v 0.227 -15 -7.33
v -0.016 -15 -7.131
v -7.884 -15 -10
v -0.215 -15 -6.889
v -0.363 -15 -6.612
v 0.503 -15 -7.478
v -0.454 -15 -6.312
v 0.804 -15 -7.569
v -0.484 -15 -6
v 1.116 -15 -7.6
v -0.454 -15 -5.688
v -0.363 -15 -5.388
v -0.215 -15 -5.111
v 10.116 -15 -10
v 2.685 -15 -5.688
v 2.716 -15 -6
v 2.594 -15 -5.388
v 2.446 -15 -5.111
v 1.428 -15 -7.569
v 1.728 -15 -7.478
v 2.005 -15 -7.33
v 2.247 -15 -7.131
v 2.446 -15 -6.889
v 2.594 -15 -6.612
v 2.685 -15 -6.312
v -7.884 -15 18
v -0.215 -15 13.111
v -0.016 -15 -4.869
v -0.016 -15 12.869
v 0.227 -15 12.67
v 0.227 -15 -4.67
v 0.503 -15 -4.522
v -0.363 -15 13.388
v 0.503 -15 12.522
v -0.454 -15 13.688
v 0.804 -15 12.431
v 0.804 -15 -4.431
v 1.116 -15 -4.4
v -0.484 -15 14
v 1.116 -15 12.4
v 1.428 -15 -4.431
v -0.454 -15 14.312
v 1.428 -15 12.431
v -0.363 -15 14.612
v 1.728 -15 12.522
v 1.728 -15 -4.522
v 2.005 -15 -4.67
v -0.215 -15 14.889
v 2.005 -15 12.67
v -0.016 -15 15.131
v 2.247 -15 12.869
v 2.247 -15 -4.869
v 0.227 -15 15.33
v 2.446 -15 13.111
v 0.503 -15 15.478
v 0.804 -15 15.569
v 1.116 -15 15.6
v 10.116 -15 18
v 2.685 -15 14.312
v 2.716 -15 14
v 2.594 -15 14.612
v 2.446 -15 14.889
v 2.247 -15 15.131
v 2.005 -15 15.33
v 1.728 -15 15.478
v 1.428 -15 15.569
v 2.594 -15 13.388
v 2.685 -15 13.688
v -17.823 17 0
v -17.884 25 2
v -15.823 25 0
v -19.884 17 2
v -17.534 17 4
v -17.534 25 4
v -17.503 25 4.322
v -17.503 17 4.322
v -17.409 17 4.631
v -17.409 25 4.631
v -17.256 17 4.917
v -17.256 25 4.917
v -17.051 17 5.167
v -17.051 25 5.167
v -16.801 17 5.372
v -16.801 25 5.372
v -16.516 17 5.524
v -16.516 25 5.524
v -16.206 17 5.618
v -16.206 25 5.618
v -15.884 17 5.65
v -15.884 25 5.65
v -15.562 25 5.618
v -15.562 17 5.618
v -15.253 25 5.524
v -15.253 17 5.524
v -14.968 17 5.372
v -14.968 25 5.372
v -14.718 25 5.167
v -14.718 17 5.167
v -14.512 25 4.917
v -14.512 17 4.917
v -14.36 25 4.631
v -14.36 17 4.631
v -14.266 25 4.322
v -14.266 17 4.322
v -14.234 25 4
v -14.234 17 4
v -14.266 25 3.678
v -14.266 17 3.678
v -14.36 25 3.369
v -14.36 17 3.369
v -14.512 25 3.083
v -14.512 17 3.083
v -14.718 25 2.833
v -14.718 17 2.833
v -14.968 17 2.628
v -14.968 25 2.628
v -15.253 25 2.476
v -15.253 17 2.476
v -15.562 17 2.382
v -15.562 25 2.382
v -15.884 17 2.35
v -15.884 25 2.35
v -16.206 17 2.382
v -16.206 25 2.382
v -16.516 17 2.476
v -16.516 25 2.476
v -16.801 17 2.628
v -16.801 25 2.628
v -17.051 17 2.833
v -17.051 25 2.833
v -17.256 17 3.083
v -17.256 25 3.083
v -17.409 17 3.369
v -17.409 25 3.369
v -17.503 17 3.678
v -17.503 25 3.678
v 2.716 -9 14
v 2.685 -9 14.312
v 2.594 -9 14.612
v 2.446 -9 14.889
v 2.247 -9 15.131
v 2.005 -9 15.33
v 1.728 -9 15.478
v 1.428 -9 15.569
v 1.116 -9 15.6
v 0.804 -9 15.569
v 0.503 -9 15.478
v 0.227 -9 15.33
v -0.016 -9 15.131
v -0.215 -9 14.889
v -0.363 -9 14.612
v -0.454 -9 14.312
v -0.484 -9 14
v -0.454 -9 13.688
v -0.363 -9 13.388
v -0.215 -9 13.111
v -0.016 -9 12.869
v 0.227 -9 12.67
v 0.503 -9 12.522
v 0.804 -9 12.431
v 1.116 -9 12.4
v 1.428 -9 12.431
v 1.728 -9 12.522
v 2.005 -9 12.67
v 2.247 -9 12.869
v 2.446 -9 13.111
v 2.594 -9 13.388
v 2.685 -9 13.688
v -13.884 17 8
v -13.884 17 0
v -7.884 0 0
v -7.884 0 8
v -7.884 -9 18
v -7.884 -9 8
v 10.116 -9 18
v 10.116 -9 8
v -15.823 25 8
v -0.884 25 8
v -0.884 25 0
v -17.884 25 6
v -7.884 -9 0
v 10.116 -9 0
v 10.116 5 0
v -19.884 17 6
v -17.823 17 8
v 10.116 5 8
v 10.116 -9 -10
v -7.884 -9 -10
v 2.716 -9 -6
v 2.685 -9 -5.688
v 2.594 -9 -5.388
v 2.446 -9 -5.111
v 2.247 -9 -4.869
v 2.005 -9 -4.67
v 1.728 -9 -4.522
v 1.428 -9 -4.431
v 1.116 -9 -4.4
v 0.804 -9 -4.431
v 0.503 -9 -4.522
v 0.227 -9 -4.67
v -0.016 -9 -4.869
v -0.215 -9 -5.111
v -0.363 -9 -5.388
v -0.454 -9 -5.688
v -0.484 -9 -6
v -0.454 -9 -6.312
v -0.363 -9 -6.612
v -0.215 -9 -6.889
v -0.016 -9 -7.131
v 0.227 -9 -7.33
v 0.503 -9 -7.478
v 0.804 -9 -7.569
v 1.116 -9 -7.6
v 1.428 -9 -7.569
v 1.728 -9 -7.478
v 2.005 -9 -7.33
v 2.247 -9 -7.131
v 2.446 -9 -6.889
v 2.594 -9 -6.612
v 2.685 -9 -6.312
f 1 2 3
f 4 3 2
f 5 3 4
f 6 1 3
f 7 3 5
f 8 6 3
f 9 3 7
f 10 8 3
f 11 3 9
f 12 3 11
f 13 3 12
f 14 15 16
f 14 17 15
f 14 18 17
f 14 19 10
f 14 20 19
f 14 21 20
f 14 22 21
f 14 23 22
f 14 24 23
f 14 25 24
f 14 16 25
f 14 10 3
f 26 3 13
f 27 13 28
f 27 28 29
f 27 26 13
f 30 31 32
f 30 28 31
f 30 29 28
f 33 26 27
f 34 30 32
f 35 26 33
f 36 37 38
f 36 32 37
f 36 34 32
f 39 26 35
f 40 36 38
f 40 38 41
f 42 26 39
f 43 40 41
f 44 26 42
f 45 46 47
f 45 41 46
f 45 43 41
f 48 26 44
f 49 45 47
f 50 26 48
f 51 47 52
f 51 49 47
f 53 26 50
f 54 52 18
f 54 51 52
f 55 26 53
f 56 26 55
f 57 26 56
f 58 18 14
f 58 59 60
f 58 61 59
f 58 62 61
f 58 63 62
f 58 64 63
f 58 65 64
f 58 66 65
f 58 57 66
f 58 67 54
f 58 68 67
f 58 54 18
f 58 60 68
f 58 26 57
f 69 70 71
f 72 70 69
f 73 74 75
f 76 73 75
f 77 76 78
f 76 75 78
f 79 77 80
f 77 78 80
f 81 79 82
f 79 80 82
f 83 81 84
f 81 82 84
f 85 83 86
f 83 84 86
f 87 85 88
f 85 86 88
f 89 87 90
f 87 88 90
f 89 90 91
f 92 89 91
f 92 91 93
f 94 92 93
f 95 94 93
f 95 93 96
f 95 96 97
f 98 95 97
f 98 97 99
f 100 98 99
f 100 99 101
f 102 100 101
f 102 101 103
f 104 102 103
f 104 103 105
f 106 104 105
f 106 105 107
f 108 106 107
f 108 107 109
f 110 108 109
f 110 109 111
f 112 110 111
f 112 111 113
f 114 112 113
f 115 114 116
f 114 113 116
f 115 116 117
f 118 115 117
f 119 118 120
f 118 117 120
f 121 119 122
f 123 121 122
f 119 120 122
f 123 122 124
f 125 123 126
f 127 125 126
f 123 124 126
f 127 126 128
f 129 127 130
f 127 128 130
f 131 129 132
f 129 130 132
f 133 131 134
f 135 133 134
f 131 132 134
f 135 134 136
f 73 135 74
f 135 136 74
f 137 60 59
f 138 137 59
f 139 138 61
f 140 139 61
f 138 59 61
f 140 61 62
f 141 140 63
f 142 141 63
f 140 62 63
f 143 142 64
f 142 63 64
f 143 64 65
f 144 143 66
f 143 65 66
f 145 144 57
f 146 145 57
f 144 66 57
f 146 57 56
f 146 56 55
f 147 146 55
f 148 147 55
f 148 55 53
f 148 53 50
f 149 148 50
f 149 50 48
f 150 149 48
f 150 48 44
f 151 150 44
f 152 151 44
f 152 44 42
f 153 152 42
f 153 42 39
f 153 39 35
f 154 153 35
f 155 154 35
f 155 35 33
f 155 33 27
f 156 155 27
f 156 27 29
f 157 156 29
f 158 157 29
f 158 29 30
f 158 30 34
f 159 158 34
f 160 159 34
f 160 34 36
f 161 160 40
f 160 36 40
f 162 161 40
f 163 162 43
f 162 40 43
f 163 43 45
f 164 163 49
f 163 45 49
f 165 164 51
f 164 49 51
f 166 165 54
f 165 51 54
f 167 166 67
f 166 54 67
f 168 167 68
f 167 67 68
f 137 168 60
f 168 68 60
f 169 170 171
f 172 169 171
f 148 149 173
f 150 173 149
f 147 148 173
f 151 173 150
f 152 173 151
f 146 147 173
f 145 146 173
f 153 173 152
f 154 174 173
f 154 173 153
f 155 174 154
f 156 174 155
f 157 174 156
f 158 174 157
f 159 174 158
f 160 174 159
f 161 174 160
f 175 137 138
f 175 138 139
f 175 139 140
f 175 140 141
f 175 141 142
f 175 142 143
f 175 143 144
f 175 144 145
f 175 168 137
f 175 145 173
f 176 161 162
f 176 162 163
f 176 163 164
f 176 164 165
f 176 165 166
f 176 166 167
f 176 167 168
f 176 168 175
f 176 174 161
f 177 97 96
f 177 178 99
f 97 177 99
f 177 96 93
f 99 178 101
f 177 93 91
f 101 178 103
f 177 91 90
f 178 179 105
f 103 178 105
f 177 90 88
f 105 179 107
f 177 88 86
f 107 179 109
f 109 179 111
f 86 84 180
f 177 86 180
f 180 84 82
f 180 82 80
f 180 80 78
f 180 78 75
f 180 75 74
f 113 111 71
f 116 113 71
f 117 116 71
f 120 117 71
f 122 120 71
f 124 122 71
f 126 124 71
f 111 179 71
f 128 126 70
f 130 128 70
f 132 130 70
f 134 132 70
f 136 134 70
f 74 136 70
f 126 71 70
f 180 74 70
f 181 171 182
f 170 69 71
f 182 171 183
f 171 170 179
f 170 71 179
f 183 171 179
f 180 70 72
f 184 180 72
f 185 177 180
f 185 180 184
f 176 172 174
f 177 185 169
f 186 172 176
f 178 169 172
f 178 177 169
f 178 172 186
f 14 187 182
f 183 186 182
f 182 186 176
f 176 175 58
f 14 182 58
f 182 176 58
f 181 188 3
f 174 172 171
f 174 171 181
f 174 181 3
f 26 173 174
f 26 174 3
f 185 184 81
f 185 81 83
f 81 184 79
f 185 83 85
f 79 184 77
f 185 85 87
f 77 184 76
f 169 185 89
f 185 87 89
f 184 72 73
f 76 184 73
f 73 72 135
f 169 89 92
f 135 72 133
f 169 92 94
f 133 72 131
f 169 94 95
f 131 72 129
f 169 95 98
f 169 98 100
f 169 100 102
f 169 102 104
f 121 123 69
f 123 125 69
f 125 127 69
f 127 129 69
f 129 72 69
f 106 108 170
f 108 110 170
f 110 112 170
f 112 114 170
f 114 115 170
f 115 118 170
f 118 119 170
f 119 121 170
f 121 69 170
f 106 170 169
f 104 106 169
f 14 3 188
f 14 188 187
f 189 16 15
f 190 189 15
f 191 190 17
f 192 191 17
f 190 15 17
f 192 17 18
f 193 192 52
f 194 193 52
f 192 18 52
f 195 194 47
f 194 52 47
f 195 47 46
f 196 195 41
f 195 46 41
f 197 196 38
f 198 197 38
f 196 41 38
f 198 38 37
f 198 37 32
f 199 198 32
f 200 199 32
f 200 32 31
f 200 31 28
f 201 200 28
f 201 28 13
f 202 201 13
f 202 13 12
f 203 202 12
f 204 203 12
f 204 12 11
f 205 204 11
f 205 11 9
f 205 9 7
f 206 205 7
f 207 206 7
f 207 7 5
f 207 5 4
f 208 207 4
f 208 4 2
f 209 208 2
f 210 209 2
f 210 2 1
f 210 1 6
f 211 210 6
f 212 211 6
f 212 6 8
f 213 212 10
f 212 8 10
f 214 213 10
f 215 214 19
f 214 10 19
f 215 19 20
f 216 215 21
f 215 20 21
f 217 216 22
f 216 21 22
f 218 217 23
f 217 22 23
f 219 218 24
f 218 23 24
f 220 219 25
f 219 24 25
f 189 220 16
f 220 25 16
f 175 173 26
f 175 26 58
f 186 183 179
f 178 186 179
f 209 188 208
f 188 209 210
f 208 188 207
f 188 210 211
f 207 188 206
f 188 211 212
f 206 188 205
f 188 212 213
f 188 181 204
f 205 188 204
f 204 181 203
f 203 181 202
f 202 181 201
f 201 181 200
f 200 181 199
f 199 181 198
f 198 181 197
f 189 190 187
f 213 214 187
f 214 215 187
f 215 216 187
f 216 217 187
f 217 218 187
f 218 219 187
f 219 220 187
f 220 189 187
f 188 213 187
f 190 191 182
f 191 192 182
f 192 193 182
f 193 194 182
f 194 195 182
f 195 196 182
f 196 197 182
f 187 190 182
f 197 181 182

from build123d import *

# Parameters (mm, degrees)
F1_DEPTH  = 8
F2_W      = 18
F2_H      = 6
F3_DEPTH  = 10
F4_W      = 18
F4_H      = 6
F5_DEPTH  = 10
F6_SIZE   = 2
F7_SIZE   = 2
F8_R      = 1.65
F9_DEPTH  = 25
F10_R     = 1.6
F11_DEPTH = 25


with BuildPart() as f1:
    # F0 (on Top) → F1 (new body)
    with BuildSketch(Plane.XY):
        Polygon((-17.884355, 24.999997), (-19.884355, 16.999997), (-13.884355, 16.999997), (-7.884355, 0), (-7.884355, -15.000003), (10.115645, -15.000003), (10.115645, 4.999997), (-0.884355, 24.999997), align=None)
    extrude(amount=F1_DEPTH)

    # F2 (on face) → F3 (join)
    with BuildSketch(Plane.XY.offset(8)):
        with Locations((1.115645, -12.000003)):
            Rectangle(F2_W, F2_H)
    extrude(amount=F3_DEPTH)

    # F4 (on face) → F5 (join)
    with BuildSketch(Plane(origin=(0, 0, 0), x_dir=(1, 0, 0), z_dir=(0, 0, -1))):
        with Locations((1.115645, 12.000003)):
            Rectangle(F4_W, F4_H)
    extrude(amount=F5_DEPTH)

    # F6
    f6_edges = [f1.edges().sort_by_distance(p)[0] for p in [
        (-18.884355, 20.999997, 0),
    ]]
    chamfer(f6_edges, length=F6_SIZE)

    # F7
    f7_edges = [f1.edges().sort_by_distance(p)[0] for p in [
        (-18.884355, 20.999997, 8),
    ]]
    chamfer(f7_edges, length=F7_SIZE)

    # F8 (on face) → F9 (cut)
    with BuildSketch(Plane(origin=(0, 24.999997, 0), x_dir=(-1, 0, 0), z_dir=(0, 1, 0))):
        with Locations((15.884355, 4)):
            Circle(F8_R)
    extrude(amount=-F9_DEPTH, mode=Mode.SUBTRACT)

    # F10 (on face) → F11 (cut)
    with BuildSketch(Plane.XZ.offset(15.000003)):
        with Locations((1.115645, 14)):
            Circle(F10_R)
        with Locations((1.115645, -6)):
            Circle(F10_R)
    extrude(amount=-F11_DEPTH, mode=Mode.SUBTRACT)


solid = f1.part
